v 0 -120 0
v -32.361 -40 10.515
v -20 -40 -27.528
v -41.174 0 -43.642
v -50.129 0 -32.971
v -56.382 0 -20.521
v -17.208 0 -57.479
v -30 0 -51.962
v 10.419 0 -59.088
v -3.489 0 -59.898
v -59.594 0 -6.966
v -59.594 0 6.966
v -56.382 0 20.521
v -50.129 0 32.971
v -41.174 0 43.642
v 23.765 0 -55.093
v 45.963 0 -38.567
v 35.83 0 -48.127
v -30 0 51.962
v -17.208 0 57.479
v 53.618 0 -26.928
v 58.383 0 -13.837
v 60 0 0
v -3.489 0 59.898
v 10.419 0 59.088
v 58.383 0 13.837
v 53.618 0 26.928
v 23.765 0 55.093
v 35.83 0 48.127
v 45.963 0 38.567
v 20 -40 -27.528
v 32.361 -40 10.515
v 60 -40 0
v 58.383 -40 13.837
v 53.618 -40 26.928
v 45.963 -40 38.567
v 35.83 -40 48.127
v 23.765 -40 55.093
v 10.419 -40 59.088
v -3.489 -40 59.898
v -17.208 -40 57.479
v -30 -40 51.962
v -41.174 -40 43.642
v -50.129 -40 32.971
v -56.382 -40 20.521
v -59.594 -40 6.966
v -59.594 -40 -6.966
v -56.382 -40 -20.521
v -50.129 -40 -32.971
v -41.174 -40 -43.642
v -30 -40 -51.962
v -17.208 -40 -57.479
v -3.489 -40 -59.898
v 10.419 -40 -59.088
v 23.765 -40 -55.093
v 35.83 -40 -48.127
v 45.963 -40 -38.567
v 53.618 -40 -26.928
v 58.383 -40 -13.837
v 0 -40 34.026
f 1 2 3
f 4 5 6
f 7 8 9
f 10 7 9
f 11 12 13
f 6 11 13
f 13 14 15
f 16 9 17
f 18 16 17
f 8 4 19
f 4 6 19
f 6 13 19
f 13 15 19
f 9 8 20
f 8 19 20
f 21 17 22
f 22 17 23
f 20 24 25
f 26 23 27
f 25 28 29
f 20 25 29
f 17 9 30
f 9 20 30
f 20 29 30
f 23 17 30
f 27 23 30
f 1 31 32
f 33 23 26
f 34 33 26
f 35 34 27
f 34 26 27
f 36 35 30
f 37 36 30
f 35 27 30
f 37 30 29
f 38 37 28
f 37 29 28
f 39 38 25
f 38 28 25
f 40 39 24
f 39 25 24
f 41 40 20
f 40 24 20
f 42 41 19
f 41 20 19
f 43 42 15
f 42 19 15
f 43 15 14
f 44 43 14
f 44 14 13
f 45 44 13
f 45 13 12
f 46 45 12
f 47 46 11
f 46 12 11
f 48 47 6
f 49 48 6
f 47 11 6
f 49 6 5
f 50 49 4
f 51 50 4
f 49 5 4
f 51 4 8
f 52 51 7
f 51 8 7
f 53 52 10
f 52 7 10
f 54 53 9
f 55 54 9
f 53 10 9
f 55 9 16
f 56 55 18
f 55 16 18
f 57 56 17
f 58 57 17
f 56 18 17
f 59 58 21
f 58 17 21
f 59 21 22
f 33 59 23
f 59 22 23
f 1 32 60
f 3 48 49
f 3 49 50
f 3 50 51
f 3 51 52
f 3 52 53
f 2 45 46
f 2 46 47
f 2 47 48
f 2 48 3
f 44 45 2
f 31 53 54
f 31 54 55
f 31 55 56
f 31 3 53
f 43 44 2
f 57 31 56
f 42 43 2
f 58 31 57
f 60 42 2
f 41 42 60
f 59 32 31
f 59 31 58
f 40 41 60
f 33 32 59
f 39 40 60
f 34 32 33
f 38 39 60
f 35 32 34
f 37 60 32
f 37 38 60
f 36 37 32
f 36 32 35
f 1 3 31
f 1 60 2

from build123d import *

# Parameters (mm, degrees)
F0_R     = 60
F1_DEPTH = 40


with BuildPart() as f1:
    # F0 (on Front) → F1 (new body)
    with BuildSketch(Plane.XZ):
        Circle(F0_R)
    extrude(amount=F1_DEPTH)

    # F2 (on face) → F5 section 0
    with BuildSketch(Plane.XZ.offset(40), mode=Mode.PRIVATE) as f5_s0:
        Polygon((32.36068, 10.514622), (0, 34.026032), (-32.36068, 10.514622), (-20, -27.527638), (20, -27.527638), align=None)
    loft([f5_s0.sketch, Vertex(0, -120, 0)])


solid = f1.part
